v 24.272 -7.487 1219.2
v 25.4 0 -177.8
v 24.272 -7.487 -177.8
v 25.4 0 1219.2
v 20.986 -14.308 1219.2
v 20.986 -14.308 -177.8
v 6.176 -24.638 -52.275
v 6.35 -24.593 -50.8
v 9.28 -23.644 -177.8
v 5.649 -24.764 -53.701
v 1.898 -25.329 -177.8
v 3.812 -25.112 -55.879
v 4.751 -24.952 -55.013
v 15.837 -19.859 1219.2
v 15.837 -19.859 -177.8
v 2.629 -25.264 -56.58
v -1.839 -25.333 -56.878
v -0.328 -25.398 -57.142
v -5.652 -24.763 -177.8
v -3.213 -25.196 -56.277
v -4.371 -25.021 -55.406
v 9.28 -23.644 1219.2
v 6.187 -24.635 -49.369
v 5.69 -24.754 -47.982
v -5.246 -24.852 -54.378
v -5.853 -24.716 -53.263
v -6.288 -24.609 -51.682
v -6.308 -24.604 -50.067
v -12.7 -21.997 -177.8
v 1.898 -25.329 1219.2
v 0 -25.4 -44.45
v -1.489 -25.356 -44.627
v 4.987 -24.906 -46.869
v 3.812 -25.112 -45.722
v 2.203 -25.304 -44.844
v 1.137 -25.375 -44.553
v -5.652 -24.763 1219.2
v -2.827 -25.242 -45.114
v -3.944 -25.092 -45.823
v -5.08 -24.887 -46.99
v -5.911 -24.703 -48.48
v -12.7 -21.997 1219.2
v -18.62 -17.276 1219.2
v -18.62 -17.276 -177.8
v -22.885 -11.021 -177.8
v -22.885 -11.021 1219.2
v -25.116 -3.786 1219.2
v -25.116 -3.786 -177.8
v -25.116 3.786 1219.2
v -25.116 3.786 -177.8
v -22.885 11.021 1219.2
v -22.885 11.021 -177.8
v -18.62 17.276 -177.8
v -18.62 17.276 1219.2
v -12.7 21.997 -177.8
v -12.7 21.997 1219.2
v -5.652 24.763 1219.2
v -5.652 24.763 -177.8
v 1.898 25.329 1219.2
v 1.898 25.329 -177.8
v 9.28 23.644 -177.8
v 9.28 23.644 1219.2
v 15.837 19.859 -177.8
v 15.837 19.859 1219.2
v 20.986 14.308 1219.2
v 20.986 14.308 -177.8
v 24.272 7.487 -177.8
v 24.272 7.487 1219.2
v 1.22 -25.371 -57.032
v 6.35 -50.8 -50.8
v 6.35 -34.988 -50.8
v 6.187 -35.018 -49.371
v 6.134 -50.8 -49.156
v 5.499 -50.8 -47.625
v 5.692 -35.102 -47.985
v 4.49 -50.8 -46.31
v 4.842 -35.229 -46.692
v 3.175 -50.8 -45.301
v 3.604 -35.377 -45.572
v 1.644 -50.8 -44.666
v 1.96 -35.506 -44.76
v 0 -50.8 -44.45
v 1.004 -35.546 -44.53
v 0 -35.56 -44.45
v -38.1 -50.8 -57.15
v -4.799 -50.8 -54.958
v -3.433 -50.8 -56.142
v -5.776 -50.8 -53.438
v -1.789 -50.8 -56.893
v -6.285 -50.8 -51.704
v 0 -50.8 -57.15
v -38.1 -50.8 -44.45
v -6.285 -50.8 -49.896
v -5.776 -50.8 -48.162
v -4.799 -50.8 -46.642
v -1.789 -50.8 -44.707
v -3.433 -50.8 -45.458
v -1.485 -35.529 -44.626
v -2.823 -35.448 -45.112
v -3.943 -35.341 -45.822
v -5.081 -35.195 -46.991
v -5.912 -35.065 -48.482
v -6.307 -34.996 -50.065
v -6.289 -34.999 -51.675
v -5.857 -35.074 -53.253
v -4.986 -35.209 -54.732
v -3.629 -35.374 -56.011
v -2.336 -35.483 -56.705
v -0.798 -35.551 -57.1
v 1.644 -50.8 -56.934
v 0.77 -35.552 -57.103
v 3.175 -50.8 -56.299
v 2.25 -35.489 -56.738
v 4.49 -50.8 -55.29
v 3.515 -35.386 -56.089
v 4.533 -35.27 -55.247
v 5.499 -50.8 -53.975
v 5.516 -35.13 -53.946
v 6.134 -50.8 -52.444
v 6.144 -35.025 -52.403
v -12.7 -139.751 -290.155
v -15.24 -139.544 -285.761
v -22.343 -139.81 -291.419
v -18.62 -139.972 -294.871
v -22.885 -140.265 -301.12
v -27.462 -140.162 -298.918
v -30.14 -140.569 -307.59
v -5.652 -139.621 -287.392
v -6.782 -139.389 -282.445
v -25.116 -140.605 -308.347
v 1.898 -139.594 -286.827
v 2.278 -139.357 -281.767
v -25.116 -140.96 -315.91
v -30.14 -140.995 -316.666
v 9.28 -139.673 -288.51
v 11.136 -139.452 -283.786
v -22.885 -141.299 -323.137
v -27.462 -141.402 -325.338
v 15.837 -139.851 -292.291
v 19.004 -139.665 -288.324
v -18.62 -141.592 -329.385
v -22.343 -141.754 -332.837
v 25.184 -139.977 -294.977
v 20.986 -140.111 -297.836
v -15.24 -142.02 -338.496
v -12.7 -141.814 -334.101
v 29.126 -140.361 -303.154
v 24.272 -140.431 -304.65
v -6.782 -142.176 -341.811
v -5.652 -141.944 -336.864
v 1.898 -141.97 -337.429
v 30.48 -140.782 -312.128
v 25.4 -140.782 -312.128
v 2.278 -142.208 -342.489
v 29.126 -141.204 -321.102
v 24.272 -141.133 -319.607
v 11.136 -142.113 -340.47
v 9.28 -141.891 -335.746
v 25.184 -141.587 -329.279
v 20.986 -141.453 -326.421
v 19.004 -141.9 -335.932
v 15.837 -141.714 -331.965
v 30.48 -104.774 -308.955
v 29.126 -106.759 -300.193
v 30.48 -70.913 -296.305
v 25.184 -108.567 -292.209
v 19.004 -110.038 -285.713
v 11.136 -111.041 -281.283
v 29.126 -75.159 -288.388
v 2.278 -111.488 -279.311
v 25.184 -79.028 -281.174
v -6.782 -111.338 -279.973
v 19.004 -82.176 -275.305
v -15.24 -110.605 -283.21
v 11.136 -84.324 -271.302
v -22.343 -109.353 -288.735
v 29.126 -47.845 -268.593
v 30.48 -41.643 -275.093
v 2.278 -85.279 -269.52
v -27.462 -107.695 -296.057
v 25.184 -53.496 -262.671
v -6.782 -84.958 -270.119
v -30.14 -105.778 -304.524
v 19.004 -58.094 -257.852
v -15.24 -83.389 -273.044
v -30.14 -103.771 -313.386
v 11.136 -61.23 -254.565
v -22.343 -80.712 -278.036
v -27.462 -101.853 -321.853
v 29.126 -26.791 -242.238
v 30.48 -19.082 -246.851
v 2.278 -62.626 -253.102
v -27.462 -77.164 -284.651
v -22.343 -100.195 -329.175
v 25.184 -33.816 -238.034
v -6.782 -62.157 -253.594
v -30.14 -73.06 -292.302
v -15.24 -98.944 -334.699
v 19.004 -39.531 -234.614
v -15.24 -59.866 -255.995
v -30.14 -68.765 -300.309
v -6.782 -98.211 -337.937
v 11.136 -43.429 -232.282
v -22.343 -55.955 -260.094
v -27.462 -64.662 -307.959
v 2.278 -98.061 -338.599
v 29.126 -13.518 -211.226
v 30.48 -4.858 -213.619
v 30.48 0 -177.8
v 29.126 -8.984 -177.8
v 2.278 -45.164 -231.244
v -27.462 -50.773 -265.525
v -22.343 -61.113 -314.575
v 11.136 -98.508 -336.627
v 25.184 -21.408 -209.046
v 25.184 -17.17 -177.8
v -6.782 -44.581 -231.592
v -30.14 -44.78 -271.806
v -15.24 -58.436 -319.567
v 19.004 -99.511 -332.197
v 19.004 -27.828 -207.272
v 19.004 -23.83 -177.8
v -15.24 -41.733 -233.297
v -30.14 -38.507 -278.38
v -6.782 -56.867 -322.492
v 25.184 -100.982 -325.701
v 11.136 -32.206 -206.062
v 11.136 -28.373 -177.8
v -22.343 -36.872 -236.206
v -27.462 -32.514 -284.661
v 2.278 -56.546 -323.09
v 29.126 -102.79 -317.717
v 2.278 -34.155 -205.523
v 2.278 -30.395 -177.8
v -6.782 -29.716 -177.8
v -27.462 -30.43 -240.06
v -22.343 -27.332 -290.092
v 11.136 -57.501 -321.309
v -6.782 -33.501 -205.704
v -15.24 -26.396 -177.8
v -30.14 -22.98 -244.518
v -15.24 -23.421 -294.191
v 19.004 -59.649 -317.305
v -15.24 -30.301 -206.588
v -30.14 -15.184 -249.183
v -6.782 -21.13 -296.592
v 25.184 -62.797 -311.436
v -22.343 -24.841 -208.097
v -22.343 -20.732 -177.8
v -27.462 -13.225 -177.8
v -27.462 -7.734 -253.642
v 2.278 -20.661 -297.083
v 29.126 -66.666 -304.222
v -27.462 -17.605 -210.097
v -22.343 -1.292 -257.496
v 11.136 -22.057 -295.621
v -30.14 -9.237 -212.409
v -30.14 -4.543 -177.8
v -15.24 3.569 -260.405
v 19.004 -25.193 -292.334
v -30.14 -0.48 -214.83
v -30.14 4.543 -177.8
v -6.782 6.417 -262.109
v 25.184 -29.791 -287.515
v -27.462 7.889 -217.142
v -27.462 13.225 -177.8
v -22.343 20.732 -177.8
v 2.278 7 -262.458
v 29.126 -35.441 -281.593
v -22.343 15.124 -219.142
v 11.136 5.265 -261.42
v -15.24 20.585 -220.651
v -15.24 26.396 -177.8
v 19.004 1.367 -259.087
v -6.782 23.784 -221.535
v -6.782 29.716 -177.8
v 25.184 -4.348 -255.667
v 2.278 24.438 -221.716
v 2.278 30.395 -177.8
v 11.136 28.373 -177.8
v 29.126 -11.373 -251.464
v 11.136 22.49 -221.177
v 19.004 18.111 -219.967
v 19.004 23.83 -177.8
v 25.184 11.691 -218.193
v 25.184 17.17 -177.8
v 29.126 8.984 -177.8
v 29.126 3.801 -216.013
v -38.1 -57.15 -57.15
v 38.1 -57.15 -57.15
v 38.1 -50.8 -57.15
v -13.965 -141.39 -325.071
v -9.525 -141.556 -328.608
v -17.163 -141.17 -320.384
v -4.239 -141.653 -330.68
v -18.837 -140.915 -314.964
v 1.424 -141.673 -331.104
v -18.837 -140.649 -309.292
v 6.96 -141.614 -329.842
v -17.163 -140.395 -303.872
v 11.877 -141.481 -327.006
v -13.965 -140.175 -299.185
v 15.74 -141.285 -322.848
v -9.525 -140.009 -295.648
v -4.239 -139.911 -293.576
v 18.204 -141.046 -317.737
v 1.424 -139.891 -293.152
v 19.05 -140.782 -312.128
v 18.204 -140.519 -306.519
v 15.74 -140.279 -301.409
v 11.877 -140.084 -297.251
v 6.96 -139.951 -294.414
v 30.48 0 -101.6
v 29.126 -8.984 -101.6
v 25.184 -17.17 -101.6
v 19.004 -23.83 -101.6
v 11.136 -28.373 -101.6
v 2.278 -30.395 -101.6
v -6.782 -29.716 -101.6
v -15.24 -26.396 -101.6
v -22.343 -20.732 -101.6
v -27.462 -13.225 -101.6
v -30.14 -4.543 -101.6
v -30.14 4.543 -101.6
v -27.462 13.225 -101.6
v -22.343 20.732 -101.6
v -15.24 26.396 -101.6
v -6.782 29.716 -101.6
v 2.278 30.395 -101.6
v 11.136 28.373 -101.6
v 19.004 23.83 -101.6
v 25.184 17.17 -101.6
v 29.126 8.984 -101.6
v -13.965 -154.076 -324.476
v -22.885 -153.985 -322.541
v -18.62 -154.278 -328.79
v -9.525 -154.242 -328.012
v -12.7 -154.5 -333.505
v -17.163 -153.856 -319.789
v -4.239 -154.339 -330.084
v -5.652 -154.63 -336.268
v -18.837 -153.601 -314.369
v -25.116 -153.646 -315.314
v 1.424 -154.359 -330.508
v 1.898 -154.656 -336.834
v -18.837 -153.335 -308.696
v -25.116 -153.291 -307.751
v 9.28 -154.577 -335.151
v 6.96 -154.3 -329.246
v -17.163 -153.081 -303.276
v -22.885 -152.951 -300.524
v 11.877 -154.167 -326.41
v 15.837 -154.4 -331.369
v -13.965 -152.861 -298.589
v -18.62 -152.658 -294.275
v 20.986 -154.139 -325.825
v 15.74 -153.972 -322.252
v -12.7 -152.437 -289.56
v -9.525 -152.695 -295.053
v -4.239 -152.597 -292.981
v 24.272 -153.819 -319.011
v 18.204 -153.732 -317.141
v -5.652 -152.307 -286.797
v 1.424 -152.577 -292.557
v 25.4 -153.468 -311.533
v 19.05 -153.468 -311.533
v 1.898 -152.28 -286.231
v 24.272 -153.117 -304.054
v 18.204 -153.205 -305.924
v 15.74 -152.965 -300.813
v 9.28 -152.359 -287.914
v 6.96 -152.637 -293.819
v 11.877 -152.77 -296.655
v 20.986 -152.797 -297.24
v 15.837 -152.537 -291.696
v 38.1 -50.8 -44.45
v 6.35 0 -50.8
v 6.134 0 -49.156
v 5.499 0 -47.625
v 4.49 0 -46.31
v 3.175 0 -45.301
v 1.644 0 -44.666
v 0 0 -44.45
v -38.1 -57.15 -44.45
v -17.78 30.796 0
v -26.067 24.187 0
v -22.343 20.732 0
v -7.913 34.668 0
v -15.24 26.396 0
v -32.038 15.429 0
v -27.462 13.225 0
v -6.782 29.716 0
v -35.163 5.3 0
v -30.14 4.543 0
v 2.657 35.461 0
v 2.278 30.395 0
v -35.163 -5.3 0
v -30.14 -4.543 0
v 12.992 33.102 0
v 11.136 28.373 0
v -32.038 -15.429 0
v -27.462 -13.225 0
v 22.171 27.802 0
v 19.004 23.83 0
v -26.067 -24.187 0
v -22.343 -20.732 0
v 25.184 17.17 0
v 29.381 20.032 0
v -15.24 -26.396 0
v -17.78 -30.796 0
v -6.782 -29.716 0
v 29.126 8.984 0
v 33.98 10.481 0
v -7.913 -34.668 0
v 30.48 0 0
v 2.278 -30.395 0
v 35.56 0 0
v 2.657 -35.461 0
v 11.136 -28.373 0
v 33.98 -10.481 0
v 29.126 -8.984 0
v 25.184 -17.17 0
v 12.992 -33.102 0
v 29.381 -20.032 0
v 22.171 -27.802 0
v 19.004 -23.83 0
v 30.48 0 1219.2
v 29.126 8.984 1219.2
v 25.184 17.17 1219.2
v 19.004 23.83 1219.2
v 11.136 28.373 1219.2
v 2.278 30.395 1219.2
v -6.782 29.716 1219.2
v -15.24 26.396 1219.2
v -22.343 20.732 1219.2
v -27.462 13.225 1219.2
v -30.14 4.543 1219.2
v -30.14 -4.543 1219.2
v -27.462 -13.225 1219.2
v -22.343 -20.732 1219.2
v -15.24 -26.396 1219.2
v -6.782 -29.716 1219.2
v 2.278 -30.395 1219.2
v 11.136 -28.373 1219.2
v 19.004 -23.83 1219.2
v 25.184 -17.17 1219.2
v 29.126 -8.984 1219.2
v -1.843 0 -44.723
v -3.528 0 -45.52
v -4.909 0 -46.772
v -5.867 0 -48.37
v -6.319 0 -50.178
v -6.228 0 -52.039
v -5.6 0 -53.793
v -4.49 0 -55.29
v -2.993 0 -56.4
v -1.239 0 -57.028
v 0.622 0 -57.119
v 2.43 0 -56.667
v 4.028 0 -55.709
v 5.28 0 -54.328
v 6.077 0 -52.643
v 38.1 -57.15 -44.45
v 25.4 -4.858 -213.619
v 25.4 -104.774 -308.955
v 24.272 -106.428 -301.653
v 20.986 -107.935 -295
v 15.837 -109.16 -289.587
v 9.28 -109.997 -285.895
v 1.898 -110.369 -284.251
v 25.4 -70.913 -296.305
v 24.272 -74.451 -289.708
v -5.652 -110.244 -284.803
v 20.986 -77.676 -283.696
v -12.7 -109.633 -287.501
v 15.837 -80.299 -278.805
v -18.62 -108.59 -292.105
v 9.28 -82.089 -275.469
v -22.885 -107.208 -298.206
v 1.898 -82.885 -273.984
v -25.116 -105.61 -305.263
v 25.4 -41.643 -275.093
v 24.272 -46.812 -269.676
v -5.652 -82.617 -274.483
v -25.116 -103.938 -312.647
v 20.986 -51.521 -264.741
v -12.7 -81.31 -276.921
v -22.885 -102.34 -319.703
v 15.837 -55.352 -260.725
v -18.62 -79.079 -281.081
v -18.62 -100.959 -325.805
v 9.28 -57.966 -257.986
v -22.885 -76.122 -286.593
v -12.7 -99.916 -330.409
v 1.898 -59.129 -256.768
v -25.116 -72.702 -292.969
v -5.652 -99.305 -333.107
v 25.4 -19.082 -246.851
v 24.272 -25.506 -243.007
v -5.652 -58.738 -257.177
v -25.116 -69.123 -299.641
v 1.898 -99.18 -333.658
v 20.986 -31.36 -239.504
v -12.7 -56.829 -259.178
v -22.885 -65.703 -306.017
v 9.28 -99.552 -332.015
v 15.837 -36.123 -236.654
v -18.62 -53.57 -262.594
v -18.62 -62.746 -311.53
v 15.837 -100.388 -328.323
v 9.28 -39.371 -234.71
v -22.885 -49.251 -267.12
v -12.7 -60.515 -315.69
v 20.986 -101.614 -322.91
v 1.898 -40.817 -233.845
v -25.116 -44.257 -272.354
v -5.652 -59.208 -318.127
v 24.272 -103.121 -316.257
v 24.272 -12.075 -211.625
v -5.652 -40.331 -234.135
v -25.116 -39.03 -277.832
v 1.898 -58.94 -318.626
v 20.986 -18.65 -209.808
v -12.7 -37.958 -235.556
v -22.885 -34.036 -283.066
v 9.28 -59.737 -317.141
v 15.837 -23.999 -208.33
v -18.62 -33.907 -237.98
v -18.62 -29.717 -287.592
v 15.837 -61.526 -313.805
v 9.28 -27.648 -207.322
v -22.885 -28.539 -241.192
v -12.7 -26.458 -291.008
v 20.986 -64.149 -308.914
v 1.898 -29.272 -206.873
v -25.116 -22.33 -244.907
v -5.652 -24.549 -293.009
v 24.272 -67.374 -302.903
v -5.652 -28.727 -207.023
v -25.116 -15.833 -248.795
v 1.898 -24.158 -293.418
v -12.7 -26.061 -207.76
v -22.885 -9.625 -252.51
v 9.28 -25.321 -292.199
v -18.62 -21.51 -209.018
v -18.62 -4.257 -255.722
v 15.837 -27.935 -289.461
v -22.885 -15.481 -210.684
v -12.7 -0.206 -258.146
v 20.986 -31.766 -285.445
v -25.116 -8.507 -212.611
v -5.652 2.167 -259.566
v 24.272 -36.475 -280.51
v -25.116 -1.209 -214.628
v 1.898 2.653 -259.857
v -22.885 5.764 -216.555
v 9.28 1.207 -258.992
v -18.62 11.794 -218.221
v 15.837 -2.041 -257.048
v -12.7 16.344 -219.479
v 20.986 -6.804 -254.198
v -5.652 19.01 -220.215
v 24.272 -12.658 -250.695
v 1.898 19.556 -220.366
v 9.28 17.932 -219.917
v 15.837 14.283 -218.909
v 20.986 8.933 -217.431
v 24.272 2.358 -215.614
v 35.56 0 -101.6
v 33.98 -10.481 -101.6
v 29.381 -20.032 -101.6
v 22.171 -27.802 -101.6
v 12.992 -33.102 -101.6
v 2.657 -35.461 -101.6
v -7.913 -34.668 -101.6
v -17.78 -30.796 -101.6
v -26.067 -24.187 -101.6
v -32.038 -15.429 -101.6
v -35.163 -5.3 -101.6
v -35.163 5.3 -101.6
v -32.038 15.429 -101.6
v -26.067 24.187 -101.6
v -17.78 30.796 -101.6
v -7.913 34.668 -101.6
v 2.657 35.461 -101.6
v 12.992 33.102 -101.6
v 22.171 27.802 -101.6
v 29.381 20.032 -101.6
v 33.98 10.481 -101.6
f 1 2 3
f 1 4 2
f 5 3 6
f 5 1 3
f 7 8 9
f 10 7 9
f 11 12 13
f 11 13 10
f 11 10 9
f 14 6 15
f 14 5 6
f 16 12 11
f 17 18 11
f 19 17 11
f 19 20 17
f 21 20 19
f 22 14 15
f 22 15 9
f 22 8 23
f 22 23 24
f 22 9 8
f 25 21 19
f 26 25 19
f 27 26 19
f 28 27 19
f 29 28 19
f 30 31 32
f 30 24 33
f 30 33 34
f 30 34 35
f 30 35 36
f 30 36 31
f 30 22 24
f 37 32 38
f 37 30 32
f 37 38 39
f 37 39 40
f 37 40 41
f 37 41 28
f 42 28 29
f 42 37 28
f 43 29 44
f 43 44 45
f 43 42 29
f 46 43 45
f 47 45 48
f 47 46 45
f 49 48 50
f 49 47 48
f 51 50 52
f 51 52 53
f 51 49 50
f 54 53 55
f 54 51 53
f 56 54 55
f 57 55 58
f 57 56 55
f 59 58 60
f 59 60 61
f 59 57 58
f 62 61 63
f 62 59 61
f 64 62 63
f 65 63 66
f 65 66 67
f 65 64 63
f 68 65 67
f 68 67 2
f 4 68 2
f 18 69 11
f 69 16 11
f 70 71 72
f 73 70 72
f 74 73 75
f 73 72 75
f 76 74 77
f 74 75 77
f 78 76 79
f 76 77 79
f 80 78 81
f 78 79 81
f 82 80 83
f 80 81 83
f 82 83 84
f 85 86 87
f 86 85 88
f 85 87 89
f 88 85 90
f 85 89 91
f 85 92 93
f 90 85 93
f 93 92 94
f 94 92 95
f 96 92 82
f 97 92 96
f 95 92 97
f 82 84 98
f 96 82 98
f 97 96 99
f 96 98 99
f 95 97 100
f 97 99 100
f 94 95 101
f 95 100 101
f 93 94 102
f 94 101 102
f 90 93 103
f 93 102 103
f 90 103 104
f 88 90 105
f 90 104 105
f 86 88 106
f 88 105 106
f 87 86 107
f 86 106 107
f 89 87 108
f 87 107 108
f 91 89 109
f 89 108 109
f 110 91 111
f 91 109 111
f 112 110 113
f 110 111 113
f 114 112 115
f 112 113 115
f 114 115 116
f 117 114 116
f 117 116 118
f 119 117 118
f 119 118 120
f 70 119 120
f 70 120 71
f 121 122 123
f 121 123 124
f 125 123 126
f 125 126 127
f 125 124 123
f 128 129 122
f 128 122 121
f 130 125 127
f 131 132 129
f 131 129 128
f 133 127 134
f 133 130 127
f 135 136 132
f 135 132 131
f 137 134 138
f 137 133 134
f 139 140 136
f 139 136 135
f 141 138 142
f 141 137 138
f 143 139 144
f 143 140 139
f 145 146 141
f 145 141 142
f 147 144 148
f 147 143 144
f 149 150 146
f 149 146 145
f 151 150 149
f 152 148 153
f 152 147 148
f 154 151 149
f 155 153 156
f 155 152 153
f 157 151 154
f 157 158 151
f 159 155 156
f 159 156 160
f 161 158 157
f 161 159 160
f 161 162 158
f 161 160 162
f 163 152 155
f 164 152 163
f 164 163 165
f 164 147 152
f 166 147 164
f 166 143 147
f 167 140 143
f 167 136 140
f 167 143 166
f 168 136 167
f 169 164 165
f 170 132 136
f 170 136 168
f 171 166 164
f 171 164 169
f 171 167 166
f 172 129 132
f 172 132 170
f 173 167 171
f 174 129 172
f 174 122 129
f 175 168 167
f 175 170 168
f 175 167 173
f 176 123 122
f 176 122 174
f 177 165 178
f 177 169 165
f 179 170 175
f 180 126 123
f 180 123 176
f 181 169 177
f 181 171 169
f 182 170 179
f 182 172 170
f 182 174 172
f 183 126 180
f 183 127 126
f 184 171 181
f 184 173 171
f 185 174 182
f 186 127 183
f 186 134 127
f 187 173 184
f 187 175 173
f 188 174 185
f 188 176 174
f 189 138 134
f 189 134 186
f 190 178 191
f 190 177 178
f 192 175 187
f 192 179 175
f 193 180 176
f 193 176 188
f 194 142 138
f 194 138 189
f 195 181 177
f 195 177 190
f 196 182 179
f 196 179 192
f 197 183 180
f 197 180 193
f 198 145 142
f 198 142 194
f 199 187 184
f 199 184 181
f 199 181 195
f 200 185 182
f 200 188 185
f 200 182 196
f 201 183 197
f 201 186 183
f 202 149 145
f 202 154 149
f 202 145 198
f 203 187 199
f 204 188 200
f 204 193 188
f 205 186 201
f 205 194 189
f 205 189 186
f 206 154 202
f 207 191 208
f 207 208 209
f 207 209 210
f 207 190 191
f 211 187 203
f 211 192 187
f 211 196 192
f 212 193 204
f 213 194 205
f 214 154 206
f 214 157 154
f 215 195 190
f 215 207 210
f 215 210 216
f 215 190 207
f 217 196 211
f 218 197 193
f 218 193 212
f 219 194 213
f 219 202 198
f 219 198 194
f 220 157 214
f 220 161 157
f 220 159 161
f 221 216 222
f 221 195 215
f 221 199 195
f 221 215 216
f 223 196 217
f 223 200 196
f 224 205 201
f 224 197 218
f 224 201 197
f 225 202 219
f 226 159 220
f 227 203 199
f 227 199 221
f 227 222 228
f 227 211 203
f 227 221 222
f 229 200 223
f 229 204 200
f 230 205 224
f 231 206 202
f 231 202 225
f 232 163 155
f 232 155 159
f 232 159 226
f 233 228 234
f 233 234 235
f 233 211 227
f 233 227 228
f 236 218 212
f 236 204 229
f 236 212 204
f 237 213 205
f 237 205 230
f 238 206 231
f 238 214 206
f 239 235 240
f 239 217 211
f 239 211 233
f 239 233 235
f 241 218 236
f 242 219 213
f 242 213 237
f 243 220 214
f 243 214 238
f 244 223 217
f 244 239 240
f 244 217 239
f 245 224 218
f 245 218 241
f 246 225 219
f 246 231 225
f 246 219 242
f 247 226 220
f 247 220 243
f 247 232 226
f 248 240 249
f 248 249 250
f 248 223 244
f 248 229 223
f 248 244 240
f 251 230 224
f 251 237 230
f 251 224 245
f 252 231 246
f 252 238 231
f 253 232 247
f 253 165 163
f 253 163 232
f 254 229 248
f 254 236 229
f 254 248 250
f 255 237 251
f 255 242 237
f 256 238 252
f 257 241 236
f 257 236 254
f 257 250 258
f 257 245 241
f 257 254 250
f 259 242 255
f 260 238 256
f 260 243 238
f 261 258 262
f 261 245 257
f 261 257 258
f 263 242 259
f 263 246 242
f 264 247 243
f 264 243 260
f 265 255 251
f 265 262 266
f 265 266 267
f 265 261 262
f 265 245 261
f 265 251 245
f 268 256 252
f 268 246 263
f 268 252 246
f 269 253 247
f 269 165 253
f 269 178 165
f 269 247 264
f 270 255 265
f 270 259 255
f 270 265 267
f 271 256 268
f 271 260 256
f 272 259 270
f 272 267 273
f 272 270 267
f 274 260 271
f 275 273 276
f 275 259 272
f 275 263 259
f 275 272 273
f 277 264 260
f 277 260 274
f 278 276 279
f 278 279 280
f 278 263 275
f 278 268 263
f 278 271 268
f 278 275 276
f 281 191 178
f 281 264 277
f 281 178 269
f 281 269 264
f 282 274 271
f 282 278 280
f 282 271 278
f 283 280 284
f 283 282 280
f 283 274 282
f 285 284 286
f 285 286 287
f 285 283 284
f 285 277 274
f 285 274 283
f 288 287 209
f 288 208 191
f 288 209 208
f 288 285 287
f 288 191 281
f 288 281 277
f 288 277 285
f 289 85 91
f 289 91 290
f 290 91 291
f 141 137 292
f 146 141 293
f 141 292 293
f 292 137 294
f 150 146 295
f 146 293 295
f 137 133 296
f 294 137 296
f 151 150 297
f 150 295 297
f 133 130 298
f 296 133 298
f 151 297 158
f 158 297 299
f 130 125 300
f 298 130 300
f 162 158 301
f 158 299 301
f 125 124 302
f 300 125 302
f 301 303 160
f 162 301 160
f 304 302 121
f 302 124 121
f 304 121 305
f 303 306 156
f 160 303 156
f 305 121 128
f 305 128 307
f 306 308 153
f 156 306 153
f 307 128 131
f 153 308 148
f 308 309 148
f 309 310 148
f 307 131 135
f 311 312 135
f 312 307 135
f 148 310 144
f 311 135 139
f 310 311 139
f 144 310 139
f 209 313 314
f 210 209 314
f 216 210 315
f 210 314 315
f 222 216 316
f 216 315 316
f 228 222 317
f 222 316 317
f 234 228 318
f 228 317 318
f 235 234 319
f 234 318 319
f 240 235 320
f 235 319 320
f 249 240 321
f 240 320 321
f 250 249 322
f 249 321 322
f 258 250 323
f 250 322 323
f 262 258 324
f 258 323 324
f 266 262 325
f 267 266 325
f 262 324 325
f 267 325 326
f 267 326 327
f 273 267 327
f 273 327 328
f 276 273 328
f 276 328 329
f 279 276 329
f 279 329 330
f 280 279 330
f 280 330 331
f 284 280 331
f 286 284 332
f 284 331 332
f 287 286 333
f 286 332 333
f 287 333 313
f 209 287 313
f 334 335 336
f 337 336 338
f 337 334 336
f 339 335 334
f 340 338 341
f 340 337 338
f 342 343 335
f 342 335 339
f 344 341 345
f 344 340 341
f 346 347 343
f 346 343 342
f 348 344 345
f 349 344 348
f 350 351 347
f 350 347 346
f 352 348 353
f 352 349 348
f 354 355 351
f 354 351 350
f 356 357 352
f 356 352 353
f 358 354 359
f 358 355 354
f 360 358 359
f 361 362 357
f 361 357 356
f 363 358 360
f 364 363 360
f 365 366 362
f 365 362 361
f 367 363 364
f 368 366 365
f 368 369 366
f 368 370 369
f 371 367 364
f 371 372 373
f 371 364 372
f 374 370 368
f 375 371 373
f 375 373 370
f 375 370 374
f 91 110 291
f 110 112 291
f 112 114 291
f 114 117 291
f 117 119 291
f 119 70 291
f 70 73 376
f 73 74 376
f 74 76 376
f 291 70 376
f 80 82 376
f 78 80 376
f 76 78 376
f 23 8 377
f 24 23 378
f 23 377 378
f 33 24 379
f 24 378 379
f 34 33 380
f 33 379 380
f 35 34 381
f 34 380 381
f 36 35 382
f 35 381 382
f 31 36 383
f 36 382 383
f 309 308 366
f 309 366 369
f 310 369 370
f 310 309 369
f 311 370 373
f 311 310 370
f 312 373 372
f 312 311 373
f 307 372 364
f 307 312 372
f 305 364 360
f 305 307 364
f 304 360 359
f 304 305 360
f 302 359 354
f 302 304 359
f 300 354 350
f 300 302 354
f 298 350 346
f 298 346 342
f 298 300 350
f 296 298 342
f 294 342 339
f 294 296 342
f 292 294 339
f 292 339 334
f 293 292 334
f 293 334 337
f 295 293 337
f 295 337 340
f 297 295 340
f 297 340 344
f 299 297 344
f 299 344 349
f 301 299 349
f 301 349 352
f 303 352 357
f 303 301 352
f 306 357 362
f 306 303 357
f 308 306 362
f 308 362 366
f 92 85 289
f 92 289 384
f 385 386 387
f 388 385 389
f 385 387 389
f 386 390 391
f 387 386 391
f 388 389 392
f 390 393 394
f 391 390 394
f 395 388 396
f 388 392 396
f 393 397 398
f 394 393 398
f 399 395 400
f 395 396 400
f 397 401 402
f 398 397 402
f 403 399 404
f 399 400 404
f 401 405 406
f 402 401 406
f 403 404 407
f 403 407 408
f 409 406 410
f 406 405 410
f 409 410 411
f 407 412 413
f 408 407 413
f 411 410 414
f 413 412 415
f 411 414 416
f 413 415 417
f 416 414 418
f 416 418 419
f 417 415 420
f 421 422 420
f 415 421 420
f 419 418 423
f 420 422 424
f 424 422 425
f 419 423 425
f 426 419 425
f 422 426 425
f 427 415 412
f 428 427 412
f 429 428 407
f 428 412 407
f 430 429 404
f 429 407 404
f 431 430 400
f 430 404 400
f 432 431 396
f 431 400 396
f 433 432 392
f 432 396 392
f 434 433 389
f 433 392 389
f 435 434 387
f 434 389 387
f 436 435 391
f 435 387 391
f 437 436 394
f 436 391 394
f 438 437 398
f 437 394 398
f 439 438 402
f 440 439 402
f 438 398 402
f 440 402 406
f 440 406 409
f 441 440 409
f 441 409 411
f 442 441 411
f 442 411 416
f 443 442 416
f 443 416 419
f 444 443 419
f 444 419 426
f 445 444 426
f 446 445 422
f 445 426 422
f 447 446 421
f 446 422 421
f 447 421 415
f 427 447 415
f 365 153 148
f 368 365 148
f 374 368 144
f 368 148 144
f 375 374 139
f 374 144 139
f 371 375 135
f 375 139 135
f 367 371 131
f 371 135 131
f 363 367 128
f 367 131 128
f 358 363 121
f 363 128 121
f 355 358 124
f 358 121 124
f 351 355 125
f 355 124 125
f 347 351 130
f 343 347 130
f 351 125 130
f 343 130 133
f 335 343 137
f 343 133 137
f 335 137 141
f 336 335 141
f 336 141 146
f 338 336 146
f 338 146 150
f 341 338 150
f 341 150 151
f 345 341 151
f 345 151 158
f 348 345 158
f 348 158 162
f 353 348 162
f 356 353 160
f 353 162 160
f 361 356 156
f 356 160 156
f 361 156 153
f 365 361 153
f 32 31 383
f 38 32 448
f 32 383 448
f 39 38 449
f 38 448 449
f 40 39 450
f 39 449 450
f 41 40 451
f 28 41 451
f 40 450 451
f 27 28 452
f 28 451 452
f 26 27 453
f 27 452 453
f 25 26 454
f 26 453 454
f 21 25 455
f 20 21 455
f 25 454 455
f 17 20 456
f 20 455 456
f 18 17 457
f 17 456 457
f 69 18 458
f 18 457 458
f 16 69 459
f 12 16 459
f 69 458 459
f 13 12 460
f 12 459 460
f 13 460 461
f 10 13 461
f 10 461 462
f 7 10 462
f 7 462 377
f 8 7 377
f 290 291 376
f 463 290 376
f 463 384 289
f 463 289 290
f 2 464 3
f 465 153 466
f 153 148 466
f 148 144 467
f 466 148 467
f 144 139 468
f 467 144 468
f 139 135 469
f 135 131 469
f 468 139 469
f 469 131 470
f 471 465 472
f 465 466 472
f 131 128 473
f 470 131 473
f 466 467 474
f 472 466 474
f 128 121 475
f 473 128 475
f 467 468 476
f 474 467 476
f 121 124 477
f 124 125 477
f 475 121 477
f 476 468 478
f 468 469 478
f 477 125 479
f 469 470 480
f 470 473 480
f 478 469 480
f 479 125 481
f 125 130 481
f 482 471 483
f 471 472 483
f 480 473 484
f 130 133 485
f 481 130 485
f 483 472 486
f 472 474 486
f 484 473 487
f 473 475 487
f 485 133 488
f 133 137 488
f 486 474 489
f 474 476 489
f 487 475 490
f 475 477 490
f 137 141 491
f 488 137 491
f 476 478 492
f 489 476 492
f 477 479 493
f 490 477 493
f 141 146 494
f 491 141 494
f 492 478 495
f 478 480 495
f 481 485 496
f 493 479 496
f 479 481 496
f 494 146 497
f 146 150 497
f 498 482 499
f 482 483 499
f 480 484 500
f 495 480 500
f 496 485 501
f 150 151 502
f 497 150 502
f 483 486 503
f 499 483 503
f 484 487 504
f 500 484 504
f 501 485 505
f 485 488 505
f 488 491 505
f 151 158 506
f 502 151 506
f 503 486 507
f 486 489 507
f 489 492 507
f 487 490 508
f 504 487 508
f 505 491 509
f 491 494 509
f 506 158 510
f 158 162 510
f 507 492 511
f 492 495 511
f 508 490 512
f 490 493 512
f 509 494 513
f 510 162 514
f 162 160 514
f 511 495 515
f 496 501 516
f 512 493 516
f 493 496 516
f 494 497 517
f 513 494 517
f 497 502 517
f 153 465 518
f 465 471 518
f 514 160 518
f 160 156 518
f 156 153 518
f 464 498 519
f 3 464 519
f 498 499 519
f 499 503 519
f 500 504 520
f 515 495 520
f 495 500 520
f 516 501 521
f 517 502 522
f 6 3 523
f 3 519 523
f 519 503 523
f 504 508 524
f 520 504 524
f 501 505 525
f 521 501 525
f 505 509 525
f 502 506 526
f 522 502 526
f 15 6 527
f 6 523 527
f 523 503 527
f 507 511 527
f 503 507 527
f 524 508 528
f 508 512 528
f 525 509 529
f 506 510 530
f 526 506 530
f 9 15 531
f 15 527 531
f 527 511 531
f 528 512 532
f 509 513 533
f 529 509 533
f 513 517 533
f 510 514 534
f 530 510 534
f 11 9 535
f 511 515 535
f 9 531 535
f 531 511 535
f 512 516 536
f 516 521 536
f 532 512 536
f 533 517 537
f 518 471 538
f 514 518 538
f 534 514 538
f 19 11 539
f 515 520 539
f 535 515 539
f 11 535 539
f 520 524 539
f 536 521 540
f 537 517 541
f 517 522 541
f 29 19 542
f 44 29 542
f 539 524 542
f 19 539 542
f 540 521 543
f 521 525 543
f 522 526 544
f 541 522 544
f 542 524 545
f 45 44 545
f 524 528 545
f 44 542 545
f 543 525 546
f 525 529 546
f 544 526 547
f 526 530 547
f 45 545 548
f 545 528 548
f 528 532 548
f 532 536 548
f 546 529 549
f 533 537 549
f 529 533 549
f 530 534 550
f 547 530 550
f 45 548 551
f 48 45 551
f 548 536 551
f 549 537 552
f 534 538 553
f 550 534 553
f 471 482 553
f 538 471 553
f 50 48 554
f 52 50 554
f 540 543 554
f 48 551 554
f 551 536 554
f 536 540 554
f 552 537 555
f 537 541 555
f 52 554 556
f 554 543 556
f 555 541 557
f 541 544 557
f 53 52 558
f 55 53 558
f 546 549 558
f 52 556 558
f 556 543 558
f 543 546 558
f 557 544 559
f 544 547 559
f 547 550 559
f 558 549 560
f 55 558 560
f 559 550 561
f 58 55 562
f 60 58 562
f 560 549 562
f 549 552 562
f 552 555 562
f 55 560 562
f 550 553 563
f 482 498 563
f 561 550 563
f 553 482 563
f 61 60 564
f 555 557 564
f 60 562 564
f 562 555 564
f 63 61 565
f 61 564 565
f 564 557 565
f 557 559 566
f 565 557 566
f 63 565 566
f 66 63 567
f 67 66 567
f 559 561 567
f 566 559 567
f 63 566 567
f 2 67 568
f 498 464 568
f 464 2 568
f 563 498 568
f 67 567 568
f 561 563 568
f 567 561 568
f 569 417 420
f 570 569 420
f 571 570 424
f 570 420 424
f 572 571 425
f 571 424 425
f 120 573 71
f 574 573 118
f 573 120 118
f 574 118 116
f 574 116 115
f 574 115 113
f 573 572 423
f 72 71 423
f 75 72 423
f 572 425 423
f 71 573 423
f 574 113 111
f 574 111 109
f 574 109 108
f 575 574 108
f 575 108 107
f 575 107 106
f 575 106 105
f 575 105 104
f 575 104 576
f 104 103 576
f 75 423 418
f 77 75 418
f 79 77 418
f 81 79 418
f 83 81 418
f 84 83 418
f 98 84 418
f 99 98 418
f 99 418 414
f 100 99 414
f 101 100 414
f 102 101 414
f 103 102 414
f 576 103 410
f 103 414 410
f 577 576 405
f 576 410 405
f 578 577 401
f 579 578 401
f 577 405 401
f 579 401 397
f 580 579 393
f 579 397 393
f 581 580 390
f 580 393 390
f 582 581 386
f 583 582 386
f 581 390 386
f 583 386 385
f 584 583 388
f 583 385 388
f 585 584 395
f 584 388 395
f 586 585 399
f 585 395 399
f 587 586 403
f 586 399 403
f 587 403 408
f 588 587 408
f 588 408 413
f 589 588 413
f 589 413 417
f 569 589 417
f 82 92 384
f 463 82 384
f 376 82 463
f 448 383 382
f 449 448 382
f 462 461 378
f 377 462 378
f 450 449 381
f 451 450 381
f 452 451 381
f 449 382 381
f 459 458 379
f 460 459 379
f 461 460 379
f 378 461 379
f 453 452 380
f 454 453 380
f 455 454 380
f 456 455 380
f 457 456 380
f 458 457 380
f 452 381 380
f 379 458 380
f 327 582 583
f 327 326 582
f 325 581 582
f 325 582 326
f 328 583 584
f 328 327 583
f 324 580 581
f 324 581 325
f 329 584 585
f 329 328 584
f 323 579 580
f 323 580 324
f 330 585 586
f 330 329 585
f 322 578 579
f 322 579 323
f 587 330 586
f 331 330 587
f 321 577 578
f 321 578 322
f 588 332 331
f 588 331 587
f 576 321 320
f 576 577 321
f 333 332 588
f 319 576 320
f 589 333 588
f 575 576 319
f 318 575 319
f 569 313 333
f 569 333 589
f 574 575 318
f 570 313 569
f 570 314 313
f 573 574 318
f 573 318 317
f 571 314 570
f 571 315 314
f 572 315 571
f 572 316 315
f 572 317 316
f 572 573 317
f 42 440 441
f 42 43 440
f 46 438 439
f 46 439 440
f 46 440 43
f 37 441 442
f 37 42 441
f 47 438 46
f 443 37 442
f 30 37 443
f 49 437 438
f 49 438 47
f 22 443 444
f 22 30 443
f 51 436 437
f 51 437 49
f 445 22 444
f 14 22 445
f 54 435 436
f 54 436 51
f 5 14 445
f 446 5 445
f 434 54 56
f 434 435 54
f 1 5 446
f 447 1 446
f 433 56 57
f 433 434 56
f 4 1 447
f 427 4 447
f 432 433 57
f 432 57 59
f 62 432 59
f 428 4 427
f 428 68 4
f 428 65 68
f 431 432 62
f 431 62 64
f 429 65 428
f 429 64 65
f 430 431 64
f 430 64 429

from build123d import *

# Parameters (mm, degrees)
F0_R        = 30.48
F0_R_2      = 25.4
F1_DEPTH    = 1219.2
F2_R        = 35.56
F2_R_2      = 25.4
F3_DEPTH    = 101.6
F5_DEPTH    = 50.8
F6_W        = 76.2
F6_H        = 12.7
F7_DEPTH    = 6.35
F8_R        = 30.48
F8_R_2      = 25.4
F9_DEPTH    = 76.2
F9_FACE_R   = 30.48
F9_FACE_R_2 = 25.4
F12_R       = 25.4
F12_R_2     = 19.05
F13_DEPTH   = 12.7


with BuildPart() as f1:
    # F0 (on Top) → F1 (new body)
    with BuildSketch(Plane.XY):
        Circle(F0_R)
        Circle(F0_R_2, mode=Mode.SUBTRACT)
    extrude(amount=F1_DEPTH)

    # F2 (on face) → F3 (join)
    with BuildSketch(Plane(origin=(0, 0, 0), x_dir=(1, 0, 0), z_dir=(0, 0, -1))):
        Circle(F2_R)
        Circle(F2_R_2, mode=Mode.SUBTRACT)
    extrude(amount=F3_DEPTH)

    # F4 (on Front) → F5 (join)
    with BuildSketch(Plane.XZ):
        with BuildLine():
            ThreePointArc((0, -44.45), (-4.4901280605, -55.2901280605), (6.35, -50.8))
            ThreePointArc((6.35, -50.8), (4.4901280605, -46.3098719395), (0, -44.45))
        make_face()
    extrude(amount=F5_DEPTH)

    # F6 (on face) → F7 (join)
    with BuildSketch(Plane.XZ.offset(50.8)):
        with Locations((0, -50.8)):
            Rectangle(F6_W, F6_H)
    extrude(amount=F7_DEPTH)

    # F8 (on face) → F9 (join)
    with BuildSketch(Plane(origin=(0, 0, -101.6), x_dir=(1, 0, 0), z_dir=(0, 0, -1))):
        Circle(F8_R)
        Circle(F8_R_2, mode=Mode.SUBTRACT)
    extrude(amount=F9_DEPTH)

    # F11: sweep along a path in F10
    with BuildLine(Plane.YZ) as f11_path:
        ThreePointArc((-140.7822519541, -312.1280968189), (-41.6434730439, -275.0929597405), (0, -177.8))
    # F9_face (on face) → F11 (sweep)
    with BuildSketch(Plane(origin=(0, 0, -177.8), x_dir=(1, 0, 0), z_dir=(0, 0, -1))):
        Circle(F9_FACE_R)
        Circle(F9_FACE_R_2, mode=Mode.SUBTRACT)
    sweep(path=f11_path.line)


with BuildPart() as f13:
    # F12 (on face) → F13 (new body)
    with BuildSketch(Plane(origin=(0, -125.85161463, 5.9082702769), x_dir=(1, 0, 0), z_dir=(0, -0.9988998397, 0.0468946723))):
        with Locations((0, -318.3866434485)):
            Circle(F12_R)
        with Locations((0, -318.3866434485)):
            Circle(F12_R_2, mode=Mode.SUBTRACT)
    extrude(amount=F13_DEPTH)


solid = Compound([f1.part, f13.part])
